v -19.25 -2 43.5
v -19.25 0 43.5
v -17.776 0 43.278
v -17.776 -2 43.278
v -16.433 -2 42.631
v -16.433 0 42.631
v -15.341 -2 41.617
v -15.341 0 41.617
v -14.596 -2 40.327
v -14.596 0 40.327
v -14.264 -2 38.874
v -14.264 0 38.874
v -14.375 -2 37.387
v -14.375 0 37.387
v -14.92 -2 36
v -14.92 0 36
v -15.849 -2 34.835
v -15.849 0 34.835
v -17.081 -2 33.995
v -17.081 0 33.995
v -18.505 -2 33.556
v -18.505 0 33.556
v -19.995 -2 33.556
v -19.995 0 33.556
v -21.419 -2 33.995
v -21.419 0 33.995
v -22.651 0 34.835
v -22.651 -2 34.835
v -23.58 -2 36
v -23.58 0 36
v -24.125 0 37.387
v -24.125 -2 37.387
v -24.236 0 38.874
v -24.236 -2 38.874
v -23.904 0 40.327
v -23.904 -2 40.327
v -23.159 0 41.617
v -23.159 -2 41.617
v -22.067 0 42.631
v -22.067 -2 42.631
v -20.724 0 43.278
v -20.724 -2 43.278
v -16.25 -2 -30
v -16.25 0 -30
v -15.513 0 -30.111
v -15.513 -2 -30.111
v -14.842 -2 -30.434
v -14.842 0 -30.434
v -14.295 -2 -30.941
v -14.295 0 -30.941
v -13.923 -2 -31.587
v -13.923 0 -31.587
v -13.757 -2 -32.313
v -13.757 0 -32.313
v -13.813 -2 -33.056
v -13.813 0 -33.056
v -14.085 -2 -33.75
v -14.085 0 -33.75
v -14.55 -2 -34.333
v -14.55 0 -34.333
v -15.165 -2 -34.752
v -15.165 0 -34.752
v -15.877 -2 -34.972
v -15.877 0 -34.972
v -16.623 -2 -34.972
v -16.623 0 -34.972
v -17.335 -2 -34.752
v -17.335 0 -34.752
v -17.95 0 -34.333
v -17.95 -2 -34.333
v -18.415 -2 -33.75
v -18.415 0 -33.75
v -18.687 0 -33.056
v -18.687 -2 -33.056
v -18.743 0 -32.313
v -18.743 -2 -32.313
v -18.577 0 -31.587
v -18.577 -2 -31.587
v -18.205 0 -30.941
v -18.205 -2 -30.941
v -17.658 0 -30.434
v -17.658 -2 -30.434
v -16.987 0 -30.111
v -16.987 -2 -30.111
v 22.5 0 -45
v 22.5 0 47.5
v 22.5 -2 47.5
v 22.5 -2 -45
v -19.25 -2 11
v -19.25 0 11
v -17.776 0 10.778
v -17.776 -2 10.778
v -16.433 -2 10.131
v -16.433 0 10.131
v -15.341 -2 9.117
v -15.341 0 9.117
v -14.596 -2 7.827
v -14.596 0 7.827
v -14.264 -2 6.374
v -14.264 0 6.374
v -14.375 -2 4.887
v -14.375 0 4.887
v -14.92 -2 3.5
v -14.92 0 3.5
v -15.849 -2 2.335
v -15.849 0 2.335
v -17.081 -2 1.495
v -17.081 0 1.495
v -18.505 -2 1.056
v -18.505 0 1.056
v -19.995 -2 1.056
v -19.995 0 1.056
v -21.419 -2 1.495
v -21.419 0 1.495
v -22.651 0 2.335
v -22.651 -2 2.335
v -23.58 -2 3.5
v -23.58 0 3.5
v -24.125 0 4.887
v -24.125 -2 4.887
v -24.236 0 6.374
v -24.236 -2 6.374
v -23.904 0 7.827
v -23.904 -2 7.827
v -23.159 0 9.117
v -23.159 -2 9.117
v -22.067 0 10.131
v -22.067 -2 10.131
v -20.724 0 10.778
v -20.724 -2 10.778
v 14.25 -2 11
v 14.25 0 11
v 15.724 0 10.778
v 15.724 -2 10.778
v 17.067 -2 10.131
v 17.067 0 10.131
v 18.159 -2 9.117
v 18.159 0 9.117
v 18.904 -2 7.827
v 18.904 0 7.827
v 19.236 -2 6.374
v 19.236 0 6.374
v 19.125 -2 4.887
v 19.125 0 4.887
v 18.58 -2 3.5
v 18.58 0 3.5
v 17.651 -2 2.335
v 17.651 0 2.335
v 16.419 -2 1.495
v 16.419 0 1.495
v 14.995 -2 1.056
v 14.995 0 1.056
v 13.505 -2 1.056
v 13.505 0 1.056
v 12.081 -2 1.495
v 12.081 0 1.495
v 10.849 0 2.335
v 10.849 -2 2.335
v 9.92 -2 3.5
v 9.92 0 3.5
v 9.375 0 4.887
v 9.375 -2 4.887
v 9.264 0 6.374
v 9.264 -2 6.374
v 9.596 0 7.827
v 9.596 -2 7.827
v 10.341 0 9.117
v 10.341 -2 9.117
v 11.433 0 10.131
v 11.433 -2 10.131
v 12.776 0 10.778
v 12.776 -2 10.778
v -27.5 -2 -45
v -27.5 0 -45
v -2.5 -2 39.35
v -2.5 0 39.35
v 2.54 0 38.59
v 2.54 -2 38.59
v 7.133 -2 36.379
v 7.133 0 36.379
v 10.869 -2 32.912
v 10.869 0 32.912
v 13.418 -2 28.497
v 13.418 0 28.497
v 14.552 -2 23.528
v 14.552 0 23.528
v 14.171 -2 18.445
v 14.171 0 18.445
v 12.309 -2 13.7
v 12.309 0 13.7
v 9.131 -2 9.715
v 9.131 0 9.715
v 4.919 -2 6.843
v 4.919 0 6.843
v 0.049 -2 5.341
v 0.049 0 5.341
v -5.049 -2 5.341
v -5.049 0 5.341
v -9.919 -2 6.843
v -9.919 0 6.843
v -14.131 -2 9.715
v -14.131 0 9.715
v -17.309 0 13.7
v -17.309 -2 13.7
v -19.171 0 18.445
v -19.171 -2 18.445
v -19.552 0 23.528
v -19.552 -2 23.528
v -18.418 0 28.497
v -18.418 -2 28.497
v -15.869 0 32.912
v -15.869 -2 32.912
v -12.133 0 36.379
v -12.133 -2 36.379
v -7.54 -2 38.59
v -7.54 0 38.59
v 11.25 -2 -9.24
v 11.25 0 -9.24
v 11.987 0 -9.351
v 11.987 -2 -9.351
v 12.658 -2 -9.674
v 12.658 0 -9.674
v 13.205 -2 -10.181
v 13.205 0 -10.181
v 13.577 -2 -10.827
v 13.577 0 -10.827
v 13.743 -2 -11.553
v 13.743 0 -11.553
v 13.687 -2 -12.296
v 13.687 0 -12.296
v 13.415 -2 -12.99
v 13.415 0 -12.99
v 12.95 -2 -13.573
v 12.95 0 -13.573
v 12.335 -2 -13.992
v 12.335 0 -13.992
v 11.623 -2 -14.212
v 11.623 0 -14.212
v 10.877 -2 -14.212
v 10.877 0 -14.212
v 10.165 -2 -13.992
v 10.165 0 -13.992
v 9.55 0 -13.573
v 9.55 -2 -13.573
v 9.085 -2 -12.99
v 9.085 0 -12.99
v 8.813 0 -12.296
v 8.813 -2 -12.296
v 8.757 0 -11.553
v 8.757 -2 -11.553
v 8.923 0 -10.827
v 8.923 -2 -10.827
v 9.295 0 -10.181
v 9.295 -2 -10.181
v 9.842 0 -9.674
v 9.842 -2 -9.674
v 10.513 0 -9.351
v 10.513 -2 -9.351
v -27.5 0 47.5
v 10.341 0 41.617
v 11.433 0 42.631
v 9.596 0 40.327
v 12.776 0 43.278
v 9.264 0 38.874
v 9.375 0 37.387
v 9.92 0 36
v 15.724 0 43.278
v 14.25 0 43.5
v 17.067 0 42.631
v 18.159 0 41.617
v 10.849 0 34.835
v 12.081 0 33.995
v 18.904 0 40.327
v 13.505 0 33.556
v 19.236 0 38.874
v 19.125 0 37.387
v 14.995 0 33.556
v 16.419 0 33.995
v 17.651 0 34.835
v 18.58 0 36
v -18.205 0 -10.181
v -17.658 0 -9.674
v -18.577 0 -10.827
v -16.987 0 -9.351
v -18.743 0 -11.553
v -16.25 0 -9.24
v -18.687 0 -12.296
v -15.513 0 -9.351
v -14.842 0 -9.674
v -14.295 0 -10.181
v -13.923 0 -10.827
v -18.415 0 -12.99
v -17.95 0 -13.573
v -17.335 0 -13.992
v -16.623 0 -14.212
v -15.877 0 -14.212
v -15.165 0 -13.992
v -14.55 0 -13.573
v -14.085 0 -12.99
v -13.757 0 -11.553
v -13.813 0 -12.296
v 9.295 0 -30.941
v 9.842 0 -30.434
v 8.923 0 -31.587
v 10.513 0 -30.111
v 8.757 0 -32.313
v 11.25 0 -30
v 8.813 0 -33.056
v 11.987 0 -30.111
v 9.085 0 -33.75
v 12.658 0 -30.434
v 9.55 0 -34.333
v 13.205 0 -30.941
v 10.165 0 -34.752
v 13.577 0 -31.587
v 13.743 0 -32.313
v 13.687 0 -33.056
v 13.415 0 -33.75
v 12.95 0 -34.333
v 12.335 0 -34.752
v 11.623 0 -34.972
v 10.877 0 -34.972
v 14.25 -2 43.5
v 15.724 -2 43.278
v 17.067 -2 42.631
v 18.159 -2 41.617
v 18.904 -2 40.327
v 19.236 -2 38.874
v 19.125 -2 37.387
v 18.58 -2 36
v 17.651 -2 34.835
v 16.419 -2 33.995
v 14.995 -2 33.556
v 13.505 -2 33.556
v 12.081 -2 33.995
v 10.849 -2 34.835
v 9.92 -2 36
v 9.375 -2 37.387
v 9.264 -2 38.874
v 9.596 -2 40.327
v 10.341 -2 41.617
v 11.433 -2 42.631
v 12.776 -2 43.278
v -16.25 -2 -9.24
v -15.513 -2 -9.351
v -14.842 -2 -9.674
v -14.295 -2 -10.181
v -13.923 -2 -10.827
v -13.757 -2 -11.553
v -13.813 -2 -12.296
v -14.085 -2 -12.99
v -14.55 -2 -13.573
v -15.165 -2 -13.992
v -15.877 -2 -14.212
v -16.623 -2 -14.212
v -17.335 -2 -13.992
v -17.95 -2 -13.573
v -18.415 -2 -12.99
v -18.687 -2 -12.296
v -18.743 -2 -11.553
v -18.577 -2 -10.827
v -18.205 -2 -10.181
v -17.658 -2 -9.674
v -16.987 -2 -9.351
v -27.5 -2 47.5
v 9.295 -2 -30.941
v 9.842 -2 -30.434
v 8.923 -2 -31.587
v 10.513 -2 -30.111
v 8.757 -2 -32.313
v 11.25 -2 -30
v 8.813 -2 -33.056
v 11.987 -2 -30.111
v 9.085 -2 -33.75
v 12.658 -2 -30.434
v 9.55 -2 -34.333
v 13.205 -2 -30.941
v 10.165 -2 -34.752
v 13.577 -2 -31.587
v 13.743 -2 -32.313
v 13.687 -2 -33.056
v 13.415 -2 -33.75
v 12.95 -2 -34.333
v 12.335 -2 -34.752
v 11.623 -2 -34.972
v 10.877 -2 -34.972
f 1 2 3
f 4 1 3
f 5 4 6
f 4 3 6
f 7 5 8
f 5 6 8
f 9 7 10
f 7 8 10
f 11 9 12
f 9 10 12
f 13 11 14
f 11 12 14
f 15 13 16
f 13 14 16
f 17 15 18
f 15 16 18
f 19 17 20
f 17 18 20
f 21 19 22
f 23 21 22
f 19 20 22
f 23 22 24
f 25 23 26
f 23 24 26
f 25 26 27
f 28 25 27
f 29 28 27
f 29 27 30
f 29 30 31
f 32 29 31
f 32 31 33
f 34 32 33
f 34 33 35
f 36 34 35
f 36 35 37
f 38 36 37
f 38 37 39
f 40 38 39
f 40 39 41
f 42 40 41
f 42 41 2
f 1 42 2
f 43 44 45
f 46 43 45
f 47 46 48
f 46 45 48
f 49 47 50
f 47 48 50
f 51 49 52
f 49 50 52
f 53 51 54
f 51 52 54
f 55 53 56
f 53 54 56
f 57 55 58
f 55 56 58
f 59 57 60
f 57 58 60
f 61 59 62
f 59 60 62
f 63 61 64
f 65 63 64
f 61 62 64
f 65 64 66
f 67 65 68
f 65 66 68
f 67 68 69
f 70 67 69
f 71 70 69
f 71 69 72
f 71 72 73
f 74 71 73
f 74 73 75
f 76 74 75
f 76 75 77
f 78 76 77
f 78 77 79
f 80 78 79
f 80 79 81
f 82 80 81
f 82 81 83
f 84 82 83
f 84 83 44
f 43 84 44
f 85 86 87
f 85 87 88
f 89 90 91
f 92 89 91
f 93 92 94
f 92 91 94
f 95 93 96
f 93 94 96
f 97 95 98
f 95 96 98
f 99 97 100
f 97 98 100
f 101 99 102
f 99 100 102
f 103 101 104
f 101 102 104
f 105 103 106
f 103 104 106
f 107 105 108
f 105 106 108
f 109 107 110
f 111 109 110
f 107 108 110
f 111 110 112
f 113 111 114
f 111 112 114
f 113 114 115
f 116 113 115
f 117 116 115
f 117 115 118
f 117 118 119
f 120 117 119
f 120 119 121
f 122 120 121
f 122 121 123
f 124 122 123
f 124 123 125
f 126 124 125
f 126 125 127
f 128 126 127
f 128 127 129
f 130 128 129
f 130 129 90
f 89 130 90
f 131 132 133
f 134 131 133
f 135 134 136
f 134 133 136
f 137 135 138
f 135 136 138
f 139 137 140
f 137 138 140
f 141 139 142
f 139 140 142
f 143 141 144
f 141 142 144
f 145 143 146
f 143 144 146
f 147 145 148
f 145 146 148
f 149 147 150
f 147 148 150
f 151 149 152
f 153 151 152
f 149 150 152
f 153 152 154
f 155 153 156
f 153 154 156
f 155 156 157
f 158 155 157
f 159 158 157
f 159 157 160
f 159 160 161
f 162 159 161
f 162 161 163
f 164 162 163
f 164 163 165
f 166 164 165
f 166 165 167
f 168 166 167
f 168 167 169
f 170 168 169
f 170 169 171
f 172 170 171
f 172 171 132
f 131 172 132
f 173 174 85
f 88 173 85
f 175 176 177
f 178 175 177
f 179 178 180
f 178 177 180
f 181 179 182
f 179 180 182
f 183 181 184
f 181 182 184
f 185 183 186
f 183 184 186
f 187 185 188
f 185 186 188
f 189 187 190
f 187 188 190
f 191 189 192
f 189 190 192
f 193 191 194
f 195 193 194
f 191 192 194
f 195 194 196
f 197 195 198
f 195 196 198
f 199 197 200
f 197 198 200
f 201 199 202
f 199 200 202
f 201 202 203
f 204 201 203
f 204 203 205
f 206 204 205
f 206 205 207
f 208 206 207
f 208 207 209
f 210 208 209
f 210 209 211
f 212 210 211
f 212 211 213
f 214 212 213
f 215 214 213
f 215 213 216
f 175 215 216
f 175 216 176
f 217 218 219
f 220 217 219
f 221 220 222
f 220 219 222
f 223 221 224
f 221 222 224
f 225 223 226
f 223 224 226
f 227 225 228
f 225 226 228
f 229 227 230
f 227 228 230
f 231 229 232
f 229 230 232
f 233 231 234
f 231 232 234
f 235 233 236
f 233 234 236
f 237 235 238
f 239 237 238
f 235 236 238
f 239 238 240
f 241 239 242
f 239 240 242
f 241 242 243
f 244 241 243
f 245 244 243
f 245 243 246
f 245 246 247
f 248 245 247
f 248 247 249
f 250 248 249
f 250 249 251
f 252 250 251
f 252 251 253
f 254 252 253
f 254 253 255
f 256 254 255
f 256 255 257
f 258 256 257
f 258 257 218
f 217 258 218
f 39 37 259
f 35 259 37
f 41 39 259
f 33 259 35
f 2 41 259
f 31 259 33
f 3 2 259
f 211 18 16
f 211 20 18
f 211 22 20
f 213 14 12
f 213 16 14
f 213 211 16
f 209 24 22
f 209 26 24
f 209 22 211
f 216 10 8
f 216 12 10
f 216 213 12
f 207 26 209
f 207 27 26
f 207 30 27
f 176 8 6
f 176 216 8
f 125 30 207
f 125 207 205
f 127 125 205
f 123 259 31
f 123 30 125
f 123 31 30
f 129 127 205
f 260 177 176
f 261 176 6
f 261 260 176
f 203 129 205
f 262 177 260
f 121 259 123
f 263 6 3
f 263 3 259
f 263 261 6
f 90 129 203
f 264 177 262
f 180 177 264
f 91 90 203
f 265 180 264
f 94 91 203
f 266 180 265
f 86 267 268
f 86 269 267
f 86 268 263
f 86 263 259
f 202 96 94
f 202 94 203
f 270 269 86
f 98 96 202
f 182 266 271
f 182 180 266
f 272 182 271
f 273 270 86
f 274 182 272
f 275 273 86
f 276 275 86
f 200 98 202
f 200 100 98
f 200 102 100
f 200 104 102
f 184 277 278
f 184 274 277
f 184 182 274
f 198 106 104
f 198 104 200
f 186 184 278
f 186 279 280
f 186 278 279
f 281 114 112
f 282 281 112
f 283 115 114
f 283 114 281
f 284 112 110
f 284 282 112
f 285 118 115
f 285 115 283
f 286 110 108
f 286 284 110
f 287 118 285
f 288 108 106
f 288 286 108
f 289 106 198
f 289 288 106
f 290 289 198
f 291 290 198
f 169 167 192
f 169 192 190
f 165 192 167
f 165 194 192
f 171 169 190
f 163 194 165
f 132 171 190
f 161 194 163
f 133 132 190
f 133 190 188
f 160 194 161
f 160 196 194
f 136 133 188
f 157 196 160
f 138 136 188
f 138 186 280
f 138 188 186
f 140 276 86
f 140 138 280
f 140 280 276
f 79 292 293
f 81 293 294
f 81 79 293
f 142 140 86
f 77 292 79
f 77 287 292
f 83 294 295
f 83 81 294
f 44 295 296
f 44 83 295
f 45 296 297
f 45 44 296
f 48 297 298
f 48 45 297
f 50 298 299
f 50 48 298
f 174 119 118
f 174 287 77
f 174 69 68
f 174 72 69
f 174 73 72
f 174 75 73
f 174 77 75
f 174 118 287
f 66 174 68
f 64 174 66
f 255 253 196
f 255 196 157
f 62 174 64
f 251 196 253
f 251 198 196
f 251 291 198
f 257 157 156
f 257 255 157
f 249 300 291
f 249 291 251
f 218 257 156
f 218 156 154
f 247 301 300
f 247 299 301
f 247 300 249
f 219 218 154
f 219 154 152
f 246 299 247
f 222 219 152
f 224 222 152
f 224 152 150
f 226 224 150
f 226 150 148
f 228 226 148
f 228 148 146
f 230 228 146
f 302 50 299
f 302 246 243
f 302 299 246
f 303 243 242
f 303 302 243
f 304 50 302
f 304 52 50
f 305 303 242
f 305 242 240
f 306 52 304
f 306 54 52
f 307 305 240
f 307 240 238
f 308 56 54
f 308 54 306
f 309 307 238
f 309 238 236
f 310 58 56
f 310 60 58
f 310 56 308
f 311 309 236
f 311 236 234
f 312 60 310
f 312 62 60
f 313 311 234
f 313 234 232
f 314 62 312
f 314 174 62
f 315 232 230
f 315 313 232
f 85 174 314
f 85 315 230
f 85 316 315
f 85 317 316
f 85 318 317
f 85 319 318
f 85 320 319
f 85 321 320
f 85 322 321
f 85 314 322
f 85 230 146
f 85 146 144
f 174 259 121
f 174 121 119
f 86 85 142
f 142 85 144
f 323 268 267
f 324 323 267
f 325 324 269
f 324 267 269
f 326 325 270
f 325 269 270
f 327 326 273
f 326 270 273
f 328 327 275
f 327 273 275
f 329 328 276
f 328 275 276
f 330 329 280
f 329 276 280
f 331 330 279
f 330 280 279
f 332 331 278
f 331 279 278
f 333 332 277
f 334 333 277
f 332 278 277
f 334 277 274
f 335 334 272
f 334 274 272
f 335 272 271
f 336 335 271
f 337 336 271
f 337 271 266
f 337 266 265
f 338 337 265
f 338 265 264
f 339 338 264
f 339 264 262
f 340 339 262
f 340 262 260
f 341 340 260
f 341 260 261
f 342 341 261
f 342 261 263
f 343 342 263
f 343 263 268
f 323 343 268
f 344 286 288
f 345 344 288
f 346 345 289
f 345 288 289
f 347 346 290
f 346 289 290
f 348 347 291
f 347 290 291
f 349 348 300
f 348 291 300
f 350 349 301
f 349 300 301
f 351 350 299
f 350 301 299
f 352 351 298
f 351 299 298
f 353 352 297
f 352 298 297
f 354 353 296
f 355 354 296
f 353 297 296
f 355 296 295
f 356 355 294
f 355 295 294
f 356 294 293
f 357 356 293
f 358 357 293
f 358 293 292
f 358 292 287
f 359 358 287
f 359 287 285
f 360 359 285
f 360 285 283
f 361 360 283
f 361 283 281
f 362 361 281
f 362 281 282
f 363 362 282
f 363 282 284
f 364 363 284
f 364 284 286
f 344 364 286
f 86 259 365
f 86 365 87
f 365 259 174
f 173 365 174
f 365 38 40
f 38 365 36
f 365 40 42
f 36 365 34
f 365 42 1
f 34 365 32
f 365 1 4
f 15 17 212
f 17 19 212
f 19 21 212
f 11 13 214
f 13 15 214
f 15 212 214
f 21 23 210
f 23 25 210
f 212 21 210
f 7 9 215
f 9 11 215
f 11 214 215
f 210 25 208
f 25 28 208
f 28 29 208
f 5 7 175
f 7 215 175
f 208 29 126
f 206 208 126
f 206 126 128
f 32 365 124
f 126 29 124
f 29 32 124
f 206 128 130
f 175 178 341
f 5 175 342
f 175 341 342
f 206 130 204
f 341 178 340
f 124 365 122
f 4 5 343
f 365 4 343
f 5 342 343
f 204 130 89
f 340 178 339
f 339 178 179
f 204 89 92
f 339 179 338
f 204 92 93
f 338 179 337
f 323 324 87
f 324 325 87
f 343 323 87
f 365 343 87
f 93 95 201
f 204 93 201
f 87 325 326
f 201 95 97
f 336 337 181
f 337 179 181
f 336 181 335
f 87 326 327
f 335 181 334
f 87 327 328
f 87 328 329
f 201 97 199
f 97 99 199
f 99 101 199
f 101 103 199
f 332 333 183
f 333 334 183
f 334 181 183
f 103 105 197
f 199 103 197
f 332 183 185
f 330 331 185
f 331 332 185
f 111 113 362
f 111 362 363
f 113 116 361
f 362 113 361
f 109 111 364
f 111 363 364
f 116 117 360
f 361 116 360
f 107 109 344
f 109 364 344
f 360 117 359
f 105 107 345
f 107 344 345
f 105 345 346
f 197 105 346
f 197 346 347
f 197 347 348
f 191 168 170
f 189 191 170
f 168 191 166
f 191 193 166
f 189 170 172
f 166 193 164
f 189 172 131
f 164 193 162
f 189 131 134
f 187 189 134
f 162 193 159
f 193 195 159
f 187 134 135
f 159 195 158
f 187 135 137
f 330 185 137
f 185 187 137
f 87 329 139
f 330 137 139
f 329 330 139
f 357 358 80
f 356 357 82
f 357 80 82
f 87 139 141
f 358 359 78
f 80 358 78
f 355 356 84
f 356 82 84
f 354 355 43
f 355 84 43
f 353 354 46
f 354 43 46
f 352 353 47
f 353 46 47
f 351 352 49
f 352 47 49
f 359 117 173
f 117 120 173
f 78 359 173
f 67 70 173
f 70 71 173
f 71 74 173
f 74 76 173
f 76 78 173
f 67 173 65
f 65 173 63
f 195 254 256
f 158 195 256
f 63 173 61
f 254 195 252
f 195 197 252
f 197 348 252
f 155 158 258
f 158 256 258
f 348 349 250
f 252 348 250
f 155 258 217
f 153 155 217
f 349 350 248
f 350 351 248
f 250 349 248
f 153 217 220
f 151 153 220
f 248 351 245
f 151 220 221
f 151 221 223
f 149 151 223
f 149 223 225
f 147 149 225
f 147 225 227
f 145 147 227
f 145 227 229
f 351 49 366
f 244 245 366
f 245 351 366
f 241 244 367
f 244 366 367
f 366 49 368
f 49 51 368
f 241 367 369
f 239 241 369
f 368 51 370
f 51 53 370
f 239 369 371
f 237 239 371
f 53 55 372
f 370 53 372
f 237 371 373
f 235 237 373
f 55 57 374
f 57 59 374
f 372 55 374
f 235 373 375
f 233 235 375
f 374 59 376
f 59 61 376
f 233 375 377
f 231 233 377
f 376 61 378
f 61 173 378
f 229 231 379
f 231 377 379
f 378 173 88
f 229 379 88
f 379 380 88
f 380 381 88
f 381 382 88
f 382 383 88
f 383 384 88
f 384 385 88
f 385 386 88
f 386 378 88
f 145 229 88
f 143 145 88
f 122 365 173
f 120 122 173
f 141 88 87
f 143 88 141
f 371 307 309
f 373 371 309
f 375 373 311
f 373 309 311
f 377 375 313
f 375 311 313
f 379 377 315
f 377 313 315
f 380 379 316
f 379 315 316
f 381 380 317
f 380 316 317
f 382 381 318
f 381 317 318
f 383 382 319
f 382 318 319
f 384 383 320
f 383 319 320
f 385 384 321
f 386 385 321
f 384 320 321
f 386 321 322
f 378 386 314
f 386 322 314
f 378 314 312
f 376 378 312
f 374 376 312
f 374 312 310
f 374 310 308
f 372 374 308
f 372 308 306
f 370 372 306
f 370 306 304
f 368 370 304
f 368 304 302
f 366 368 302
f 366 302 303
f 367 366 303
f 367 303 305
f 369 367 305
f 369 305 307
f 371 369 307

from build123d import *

# Parameters (mm, degrees)
SKETCH2_W          = 50
SKETCH2_H          = 92.5
BASE_FLANGE1_DEPTH = 2
SKETCH1_R          = 2.5
SKETCH1_R_2        = 5
SKETCH1_R_3        = 17.1
CUT_EXTRUDE1_DEPTH = 10


# Sheet-metal steps are written as plain solids
with BuildPart() as part:
    # Sketch2 → Base-Flange1 (new body)
    with BuildSketch(Plane(origin=(0, 0, 0), x_dir=(1, 0, 0), z_dir=(0, 1, 0))):
        with Locations((-2.5, -1.25)):
            Rectangle(SKETCH2_W, SKETCH2_H)
    extrude(amount=-BASE_FLANGE1_DEPTH)

    # Sketch1 → Cut-Extrude1 (cut)
    with BuildSketch(Plane(origin=(0, 0, 0), x_dir=(1, 0, 0), z_dir=(0, 1, 0))):
        with Locations(Location((-16.25, 11.74, 0), (0, 0, 270))):
            Circle(SKETCH1_R)
        with Locations(Location((11.25, 11.74, 0), (0, 0, 270))):
            Circle(SKETCH1_R)
        with Locations(Location((11.25, 32.5, 0), (0, 0, 270))):
            Circle(SKETCH1_R)
        with Locations(Location((-19.25, -38.5, 0), (0, 0, 270))):
            Circle(SKETCH1_R_2)
        with Locations(Location((14.25, -38.5, 0), (0, 0, 270))):
            Circle(SKETCH1_R_2)
        with Locations(Location((14.25, -6, 0), (0, 0, 270))):
            Circle(SKETCH1_R_2)
        with Locations(Location((-19.25, -6, 0), (0, 0, 270))):
            Circle(SKETCH1_R_2)
        with Locations(Location((-16.25, 32.5, 0), (0, 0, 270))):
            Circle(SKETCH1_R)
        with Locations(Location((-2.5, -22.25, 0), (0, 0, 270))):
            Circle(SKETCH1_R_3)
    extrude(amount=-CUT_EXTRUDE1_DEPTH, mode=Mode.SUBTRACT)


solid = part.part
